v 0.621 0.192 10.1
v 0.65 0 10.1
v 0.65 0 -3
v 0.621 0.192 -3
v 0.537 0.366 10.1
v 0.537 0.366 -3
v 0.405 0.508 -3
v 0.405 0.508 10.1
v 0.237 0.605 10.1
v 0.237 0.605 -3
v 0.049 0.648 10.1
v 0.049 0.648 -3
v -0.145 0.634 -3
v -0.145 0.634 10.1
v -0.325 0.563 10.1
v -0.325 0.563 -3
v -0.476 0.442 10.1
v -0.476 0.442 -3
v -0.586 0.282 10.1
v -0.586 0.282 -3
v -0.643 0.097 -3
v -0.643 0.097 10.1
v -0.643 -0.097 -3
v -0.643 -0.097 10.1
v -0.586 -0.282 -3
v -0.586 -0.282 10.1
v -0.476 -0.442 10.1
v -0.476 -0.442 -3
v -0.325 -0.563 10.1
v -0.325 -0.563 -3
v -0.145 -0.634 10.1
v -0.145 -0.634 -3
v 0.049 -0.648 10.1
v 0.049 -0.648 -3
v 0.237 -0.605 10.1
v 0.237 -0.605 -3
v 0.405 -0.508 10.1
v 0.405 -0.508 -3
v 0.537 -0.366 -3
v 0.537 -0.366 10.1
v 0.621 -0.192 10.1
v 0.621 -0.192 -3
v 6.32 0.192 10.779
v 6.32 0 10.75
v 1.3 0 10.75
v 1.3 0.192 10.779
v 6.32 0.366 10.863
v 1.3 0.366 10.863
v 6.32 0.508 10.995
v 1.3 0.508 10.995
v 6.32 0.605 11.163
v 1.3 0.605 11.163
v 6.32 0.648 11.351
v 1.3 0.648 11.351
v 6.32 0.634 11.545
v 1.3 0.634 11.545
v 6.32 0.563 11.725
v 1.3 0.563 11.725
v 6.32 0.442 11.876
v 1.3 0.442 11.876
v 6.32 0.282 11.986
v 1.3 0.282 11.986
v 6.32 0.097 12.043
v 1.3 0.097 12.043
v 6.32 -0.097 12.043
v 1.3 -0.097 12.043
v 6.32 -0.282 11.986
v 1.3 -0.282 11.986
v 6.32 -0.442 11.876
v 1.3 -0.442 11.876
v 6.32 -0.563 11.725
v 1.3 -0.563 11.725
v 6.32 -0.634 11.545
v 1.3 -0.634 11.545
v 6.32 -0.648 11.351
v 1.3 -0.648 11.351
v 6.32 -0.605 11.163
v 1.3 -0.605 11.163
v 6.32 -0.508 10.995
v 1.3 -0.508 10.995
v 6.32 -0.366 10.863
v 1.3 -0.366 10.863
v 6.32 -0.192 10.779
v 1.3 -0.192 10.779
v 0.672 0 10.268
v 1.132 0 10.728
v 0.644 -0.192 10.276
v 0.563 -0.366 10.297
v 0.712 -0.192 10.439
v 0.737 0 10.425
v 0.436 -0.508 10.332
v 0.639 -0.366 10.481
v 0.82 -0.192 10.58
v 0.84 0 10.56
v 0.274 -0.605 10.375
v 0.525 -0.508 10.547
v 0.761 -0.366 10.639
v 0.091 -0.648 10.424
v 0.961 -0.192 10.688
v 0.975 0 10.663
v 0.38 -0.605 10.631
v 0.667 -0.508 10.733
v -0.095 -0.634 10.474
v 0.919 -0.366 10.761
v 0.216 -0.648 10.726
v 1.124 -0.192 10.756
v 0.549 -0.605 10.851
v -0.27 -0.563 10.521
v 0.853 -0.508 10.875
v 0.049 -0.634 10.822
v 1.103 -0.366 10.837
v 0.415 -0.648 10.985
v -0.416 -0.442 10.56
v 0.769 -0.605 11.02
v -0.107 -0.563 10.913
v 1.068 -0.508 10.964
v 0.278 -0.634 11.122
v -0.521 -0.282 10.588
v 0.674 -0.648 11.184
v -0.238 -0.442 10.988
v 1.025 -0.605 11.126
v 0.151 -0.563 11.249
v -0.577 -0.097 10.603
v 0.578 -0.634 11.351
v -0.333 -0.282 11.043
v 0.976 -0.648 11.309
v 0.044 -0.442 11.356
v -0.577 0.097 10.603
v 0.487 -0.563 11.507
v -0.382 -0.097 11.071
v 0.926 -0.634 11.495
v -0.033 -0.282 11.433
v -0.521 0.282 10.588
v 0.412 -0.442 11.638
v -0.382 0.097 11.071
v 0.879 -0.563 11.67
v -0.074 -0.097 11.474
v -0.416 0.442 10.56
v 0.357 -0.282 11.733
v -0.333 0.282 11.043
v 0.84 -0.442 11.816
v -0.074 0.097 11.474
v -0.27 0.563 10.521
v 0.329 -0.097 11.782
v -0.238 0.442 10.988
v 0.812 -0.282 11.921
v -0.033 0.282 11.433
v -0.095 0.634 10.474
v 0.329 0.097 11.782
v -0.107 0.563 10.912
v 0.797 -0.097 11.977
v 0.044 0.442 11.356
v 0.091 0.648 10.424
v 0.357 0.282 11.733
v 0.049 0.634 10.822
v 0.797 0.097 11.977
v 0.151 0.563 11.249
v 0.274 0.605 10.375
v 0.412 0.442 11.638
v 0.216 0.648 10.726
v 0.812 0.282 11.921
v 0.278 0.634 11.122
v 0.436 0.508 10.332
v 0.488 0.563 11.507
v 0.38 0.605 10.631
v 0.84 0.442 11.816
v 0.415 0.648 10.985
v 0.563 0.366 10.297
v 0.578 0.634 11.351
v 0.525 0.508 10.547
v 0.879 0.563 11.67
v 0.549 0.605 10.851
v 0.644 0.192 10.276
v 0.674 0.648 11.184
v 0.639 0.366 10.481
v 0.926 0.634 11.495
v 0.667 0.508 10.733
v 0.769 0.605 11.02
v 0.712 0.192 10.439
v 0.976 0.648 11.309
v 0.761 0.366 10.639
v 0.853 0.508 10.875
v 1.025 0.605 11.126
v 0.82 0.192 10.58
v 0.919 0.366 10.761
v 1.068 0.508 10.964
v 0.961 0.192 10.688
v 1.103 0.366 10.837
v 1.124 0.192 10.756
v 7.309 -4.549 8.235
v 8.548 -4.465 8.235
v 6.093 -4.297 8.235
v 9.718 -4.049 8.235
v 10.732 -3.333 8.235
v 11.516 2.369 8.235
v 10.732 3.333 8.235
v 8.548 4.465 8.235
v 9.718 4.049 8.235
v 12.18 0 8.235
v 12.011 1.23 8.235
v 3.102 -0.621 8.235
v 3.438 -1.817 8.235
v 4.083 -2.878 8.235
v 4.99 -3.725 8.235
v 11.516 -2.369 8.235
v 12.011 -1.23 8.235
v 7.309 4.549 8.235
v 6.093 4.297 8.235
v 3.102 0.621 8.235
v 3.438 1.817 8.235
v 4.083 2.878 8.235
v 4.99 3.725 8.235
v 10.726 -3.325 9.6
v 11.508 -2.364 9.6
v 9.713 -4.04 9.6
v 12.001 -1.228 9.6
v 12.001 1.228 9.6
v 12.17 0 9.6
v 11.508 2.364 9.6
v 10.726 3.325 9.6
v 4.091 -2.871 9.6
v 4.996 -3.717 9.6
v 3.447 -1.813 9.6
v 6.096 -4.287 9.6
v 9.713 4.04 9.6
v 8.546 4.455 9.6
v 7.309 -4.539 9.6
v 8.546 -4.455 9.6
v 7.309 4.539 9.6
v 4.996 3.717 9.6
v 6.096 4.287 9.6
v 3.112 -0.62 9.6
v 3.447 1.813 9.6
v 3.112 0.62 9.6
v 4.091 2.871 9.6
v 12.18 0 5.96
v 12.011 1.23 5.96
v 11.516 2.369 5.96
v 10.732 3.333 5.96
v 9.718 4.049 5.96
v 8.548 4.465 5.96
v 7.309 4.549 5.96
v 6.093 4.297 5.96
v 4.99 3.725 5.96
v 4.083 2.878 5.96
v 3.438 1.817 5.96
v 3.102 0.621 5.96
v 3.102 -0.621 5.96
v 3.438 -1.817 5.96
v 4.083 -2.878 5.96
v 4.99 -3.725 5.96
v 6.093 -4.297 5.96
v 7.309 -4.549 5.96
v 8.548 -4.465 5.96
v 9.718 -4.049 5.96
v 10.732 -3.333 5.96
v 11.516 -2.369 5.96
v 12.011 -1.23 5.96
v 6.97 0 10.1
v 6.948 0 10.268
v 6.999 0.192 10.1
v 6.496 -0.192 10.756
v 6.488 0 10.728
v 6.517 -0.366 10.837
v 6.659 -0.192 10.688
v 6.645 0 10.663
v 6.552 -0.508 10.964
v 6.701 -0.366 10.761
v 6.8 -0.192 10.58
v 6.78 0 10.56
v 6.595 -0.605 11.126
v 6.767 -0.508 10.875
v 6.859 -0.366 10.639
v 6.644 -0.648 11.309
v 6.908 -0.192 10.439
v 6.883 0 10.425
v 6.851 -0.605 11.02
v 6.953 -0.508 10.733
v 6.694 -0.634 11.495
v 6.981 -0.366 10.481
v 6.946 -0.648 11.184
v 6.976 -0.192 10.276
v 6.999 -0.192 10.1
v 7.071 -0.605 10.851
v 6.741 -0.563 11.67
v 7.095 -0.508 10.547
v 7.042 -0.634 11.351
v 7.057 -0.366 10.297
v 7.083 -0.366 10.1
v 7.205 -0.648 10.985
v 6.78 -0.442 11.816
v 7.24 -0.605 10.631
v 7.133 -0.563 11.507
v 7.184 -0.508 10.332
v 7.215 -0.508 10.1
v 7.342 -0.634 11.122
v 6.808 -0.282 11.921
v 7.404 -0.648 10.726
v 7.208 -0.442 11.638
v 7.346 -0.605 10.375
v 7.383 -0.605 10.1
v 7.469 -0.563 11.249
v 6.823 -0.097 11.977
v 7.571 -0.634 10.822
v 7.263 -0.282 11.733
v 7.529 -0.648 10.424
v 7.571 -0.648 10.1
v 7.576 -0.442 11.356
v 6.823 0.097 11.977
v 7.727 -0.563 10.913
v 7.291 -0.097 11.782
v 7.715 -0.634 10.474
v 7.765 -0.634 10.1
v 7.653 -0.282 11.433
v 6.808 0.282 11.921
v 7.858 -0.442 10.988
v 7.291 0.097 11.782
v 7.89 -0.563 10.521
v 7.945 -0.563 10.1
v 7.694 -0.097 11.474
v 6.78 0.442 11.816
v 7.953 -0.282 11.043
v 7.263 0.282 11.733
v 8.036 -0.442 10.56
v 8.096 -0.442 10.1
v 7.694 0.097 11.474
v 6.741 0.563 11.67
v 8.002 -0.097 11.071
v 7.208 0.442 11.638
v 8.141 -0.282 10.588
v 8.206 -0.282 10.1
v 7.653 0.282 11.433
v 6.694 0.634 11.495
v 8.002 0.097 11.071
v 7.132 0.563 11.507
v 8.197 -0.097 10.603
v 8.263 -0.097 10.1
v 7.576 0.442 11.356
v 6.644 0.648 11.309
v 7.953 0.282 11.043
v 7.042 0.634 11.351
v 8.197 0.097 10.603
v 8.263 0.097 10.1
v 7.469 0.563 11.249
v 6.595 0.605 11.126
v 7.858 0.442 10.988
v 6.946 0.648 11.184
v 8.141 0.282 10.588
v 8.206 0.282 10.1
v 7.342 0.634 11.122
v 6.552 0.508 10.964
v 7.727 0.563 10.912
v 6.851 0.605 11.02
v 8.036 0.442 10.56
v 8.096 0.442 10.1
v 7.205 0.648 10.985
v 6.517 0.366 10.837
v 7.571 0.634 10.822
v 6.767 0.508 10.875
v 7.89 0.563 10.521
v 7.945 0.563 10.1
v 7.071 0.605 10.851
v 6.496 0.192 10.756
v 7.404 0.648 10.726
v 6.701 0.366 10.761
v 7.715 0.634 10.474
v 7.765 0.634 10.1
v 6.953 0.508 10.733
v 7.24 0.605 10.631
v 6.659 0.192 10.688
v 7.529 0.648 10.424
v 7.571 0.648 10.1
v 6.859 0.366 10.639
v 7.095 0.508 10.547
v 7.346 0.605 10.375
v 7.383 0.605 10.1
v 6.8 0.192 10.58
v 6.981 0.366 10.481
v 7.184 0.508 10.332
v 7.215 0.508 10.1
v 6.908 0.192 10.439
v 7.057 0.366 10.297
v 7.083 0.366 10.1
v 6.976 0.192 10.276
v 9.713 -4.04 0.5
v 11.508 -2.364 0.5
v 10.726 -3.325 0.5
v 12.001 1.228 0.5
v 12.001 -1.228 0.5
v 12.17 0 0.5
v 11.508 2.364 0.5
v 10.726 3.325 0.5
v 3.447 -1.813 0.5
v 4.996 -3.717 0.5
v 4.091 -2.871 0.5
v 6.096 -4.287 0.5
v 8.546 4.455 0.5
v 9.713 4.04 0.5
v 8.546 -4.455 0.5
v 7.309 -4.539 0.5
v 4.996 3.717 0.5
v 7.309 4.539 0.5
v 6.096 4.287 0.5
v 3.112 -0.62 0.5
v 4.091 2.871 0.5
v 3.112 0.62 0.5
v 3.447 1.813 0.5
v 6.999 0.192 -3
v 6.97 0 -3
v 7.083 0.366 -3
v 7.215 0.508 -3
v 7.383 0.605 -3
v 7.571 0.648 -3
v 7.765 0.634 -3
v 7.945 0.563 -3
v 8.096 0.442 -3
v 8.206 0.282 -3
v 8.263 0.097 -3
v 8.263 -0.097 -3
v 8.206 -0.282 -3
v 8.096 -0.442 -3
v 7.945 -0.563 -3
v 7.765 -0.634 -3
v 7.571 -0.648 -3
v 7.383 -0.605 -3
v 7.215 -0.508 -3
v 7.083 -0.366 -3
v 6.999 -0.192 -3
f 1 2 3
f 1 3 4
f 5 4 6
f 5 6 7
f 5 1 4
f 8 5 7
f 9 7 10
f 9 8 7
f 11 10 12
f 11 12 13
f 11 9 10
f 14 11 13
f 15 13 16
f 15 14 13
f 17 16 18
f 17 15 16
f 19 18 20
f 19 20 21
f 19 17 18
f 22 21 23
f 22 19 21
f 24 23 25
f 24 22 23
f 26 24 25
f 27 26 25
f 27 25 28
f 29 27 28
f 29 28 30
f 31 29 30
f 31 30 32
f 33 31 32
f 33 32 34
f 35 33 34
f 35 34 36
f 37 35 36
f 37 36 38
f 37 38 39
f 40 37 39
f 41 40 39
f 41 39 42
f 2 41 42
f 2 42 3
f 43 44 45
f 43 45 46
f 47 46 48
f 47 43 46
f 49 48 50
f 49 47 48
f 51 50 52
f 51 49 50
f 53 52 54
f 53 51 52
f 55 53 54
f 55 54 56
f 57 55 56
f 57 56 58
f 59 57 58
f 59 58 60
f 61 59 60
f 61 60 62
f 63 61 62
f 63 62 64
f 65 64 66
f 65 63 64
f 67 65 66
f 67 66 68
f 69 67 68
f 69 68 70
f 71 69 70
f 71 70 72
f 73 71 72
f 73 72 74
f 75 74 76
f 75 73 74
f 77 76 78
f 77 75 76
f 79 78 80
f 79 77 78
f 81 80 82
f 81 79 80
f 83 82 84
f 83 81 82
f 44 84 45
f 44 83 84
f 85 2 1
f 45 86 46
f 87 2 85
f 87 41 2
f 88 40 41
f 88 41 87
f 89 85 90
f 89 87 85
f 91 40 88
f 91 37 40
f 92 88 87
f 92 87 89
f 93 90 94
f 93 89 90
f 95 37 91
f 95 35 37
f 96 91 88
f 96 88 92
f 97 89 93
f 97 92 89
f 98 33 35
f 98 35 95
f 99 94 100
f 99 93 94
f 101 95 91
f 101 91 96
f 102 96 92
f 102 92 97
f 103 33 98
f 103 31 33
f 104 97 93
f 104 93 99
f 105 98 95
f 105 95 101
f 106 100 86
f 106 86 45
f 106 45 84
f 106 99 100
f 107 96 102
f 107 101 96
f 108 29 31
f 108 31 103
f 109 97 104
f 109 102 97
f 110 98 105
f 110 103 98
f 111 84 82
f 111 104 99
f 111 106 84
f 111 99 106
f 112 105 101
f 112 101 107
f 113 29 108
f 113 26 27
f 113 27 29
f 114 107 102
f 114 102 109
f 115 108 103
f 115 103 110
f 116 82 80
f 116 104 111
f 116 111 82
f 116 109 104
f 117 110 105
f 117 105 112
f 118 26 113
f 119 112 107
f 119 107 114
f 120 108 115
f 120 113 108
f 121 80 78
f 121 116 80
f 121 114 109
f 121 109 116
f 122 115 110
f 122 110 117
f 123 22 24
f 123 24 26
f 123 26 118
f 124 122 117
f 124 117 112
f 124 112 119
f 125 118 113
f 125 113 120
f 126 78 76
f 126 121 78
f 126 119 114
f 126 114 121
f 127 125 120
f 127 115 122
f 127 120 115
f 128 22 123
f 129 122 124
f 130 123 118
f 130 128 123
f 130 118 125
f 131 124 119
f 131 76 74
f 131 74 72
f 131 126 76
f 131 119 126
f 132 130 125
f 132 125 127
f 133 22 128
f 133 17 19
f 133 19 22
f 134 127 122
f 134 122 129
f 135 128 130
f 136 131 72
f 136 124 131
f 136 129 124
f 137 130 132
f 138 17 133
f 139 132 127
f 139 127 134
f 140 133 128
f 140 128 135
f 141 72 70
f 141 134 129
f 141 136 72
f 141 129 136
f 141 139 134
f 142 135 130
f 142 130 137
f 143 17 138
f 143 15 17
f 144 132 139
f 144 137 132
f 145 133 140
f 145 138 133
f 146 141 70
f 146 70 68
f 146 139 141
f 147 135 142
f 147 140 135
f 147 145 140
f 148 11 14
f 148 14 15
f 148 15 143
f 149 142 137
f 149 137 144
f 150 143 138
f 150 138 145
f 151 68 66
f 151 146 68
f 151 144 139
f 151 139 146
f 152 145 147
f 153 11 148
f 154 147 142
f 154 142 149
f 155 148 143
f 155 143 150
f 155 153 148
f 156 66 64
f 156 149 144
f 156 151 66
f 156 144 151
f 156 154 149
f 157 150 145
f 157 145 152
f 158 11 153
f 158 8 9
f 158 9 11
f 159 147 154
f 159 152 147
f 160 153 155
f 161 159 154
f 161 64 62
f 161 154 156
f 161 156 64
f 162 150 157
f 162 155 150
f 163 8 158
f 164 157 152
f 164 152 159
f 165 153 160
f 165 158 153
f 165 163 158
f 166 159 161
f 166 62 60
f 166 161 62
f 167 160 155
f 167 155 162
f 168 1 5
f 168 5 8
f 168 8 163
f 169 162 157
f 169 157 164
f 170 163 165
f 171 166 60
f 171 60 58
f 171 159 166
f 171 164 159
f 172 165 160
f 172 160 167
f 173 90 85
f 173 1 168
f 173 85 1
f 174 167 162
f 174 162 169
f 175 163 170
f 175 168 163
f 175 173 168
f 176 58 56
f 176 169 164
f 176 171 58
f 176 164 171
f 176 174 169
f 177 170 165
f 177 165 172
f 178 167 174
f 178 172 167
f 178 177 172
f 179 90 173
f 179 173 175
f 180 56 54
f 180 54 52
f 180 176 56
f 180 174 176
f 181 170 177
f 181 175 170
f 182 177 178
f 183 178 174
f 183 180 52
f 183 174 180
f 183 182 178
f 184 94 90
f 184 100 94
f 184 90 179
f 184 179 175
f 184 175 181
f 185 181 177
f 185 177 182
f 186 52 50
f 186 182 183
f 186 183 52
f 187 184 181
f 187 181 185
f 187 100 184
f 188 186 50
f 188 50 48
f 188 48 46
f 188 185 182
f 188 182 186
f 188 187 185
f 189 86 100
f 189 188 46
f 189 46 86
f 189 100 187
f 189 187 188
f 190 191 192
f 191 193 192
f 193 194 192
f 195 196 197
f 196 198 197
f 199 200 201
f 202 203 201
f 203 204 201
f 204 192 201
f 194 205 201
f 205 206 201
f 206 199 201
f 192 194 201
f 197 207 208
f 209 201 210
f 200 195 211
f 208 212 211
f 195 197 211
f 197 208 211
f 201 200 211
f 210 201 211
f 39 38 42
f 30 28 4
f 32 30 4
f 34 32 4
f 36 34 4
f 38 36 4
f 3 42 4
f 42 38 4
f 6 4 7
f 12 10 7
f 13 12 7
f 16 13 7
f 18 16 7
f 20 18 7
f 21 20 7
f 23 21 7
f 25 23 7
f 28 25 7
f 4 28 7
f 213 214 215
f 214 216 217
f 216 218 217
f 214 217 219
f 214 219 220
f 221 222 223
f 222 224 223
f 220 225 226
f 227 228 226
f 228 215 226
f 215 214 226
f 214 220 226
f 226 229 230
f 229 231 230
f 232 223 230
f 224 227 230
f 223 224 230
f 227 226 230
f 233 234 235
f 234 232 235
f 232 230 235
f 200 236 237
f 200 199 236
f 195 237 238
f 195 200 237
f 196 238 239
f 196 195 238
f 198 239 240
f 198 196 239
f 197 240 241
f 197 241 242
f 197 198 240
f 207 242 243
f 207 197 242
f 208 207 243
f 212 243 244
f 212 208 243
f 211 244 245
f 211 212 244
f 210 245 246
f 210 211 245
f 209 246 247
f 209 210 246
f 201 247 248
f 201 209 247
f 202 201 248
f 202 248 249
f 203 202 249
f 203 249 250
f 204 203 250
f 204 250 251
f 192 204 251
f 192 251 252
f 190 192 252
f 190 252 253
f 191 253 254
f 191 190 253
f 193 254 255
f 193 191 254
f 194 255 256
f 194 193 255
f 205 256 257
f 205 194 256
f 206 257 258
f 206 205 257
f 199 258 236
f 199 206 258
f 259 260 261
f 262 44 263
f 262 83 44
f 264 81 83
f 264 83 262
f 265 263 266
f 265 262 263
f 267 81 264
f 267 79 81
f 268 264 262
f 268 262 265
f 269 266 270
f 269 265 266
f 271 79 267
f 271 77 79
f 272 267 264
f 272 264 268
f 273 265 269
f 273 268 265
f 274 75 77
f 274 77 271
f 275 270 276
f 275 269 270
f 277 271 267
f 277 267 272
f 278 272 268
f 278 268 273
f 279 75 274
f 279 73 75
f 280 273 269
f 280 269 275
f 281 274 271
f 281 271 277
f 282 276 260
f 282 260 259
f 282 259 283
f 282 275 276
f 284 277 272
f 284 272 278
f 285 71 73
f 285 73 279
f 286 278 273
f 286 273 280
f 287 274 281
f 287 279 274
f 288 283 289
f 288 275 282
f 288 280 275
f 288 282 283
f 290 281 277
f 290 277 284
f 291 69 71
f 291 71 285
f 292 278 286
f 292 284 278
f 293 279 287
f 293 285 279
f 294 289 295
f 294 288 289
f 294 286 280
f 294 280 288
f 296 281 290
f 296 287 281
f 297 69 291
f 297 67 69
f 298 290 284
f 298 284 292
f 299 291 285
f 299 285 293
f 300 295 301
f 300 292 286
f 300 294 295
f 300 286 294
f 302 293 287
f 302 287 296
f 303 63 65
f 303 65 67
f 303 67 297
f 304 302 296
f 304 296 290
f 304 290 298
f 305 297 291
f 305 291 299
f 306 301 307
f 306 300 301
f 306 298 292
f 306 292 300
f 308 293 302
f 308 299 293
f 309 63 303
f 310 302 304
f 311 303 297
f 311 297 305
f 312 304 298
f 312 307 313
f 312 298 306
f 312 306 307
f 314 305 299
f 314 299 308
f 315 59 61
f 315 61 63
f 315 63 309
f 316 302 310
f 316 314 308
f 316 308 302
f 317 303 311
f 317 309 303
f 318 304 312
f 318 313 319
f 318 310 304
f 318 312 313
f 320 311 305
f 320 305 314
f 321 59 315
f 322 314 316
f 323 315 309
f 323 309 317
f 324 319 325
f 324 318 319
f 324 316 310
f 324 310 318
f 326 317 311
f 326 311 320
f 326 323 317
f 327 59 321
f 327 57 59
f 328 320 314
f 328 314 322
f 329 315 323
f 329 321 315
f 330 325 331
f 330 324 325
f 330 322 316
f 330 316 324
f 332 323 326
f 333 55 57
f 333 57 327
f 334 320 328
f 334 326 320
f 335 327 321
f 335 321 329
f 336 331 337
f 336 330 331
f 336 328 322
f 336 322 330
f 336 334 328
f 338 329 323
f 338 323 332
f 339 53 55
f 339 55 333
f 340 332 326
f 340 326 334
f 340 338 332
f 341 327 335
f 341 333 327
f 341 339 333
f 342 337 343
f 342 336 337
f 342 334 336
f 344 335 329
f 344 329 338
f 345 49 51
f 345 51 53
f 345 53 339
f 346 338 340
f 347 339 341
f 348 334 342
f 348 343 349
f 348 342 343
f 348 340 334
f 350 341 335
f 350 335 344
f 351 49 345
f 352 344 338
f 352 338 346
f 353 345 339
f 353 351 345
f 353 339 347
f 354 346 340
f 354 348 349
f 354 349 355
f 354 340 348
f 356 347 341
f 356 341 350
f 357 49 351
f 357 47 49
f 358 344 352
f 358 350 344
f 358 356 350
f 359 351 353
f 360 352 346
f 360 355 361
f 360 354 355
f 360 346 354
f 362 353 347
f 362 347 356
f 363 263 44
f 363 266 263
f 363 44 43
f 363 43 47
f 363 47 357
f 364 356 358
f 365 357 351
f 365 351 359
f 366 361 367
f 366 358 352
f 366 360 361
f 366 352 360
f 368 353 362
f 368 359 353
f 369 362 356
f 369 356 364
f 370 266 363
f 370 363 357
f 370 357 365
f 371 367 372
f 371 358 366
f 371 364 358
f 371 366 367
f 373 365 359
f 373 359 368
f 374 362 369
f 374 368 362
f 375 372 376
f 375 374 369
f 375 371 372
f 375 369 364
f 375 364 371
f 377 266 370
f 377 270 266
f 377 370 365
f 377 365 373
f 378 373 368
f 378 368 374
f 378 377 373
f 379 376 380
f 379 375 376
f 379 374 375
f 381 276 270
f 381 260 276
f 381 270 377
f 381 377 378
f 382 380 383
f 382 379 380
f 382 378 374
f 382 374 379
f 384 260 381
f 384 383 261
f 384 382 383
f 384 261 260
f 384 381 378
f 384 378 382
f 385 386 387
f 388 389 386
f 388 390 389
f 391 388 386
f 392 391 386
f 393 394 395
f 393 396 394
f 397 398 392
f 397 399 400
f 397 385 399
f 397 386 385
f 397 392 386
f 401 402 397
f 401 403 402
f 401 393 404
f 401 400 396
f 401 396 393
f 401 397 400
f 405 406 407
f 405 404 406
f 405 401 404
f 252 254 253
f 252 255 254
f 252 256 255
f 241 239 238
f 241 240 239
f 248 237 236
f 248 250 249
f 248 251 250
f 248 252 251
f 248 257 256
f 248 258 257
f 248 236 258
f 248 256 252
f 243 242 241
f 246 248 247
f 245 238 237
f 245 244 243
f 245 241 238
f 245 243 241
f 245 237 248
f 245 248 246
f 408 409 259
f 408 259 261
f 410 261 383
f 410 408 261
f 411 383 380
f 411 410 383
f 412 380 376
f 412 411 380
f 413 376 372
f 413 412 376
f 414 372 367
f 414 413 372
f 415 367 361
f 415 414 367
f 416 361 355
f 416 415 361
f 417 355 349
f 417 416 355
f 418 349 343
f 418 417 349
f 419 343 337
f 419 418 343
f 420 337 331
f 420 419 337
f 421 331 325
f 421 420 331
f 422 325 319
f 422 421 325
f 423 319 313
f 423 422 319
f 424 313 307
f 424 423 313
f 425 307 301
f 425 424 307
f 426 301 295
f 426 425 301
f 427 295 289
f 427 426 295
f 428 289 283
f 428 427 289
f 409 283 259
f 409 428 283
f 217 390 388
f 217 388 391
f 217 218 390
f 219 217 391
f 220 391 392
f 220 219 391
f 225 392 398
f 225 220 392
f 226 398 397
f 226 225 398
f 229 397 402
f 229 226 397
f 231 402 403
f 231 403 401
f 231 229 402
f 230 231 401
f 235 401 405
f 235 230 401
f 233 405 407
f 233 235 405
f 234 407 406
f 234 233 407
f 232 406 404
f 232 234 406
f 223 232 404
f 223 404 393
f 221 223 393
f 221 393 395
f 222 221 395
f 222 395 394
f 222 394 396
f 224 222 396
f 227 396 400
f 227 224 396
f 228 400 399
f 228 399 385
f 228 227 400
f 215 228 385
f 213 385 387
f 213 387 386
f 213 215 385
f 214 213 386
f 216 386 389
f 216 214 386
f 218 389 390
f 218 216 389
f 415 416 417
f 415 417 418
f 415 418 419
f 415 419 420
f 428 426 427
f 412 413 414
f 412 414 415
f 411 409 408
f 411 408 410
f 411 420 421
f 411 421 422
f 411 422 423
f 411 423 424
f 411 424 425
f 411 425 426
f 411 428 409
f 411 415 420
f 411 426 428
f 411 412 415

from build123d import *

# Parameters (mm, degrees)
SKETCH001_R = 0.65
SKETCH002_W = 4.55
SKETCH002_H = 9.1
SKETCH003_W = 4.56
SKETCH003_H = 2.275


with BuildPart() as sweep_body:
    # Sweep: sweep along a path in Sketch
    with BuildLine(Plane.XZ) as sweep_path:
        Line((0, -3), (0, 10.1))
        ThreePointArc((0, 10.1), (0.380761, 11.019239), (1.3, 11.4))
        Line((1.3, 11.4), (6.32, 11.4))
        ThreePointArc((6.32, 11.4), (7.239239, 11.019239), (7.62, 10.1))
        Line((7.62, 10.1), (7.62, -3))
    # Sketch001 → Sweep (sweep)
    with BuildSketch(Plane.XY):
        Circle(SKETCH001_R)
    sweep(path=sweep_path.line)


with BuildPart() as revolution:
    # Sketch002 → Revolution (revolve)
    with BuildSketch(Plane.XZ):
        with Locations((9.895, 5.05)):
            Rectangle(SKETCH002_W, SKETCH002_H)
    revolve(axis=Axis((7.62, 0, 0.5), (0, 0, 1)))


with BuildPart() as revolution001:
    # Sketch003 → Revolution001 (revolve)
    with BuildSketch(Plane.XZ):
        with Locations((9.9, 7.0975)):
            Rectangle(SKETCH003_W, SKETCH003_H)
    revolve(axis=Axis((7.62, 0, 5.96), (0, 0, 1)))


solid = Compound([sweep_body.part, revolution.part, revolution001.part])
